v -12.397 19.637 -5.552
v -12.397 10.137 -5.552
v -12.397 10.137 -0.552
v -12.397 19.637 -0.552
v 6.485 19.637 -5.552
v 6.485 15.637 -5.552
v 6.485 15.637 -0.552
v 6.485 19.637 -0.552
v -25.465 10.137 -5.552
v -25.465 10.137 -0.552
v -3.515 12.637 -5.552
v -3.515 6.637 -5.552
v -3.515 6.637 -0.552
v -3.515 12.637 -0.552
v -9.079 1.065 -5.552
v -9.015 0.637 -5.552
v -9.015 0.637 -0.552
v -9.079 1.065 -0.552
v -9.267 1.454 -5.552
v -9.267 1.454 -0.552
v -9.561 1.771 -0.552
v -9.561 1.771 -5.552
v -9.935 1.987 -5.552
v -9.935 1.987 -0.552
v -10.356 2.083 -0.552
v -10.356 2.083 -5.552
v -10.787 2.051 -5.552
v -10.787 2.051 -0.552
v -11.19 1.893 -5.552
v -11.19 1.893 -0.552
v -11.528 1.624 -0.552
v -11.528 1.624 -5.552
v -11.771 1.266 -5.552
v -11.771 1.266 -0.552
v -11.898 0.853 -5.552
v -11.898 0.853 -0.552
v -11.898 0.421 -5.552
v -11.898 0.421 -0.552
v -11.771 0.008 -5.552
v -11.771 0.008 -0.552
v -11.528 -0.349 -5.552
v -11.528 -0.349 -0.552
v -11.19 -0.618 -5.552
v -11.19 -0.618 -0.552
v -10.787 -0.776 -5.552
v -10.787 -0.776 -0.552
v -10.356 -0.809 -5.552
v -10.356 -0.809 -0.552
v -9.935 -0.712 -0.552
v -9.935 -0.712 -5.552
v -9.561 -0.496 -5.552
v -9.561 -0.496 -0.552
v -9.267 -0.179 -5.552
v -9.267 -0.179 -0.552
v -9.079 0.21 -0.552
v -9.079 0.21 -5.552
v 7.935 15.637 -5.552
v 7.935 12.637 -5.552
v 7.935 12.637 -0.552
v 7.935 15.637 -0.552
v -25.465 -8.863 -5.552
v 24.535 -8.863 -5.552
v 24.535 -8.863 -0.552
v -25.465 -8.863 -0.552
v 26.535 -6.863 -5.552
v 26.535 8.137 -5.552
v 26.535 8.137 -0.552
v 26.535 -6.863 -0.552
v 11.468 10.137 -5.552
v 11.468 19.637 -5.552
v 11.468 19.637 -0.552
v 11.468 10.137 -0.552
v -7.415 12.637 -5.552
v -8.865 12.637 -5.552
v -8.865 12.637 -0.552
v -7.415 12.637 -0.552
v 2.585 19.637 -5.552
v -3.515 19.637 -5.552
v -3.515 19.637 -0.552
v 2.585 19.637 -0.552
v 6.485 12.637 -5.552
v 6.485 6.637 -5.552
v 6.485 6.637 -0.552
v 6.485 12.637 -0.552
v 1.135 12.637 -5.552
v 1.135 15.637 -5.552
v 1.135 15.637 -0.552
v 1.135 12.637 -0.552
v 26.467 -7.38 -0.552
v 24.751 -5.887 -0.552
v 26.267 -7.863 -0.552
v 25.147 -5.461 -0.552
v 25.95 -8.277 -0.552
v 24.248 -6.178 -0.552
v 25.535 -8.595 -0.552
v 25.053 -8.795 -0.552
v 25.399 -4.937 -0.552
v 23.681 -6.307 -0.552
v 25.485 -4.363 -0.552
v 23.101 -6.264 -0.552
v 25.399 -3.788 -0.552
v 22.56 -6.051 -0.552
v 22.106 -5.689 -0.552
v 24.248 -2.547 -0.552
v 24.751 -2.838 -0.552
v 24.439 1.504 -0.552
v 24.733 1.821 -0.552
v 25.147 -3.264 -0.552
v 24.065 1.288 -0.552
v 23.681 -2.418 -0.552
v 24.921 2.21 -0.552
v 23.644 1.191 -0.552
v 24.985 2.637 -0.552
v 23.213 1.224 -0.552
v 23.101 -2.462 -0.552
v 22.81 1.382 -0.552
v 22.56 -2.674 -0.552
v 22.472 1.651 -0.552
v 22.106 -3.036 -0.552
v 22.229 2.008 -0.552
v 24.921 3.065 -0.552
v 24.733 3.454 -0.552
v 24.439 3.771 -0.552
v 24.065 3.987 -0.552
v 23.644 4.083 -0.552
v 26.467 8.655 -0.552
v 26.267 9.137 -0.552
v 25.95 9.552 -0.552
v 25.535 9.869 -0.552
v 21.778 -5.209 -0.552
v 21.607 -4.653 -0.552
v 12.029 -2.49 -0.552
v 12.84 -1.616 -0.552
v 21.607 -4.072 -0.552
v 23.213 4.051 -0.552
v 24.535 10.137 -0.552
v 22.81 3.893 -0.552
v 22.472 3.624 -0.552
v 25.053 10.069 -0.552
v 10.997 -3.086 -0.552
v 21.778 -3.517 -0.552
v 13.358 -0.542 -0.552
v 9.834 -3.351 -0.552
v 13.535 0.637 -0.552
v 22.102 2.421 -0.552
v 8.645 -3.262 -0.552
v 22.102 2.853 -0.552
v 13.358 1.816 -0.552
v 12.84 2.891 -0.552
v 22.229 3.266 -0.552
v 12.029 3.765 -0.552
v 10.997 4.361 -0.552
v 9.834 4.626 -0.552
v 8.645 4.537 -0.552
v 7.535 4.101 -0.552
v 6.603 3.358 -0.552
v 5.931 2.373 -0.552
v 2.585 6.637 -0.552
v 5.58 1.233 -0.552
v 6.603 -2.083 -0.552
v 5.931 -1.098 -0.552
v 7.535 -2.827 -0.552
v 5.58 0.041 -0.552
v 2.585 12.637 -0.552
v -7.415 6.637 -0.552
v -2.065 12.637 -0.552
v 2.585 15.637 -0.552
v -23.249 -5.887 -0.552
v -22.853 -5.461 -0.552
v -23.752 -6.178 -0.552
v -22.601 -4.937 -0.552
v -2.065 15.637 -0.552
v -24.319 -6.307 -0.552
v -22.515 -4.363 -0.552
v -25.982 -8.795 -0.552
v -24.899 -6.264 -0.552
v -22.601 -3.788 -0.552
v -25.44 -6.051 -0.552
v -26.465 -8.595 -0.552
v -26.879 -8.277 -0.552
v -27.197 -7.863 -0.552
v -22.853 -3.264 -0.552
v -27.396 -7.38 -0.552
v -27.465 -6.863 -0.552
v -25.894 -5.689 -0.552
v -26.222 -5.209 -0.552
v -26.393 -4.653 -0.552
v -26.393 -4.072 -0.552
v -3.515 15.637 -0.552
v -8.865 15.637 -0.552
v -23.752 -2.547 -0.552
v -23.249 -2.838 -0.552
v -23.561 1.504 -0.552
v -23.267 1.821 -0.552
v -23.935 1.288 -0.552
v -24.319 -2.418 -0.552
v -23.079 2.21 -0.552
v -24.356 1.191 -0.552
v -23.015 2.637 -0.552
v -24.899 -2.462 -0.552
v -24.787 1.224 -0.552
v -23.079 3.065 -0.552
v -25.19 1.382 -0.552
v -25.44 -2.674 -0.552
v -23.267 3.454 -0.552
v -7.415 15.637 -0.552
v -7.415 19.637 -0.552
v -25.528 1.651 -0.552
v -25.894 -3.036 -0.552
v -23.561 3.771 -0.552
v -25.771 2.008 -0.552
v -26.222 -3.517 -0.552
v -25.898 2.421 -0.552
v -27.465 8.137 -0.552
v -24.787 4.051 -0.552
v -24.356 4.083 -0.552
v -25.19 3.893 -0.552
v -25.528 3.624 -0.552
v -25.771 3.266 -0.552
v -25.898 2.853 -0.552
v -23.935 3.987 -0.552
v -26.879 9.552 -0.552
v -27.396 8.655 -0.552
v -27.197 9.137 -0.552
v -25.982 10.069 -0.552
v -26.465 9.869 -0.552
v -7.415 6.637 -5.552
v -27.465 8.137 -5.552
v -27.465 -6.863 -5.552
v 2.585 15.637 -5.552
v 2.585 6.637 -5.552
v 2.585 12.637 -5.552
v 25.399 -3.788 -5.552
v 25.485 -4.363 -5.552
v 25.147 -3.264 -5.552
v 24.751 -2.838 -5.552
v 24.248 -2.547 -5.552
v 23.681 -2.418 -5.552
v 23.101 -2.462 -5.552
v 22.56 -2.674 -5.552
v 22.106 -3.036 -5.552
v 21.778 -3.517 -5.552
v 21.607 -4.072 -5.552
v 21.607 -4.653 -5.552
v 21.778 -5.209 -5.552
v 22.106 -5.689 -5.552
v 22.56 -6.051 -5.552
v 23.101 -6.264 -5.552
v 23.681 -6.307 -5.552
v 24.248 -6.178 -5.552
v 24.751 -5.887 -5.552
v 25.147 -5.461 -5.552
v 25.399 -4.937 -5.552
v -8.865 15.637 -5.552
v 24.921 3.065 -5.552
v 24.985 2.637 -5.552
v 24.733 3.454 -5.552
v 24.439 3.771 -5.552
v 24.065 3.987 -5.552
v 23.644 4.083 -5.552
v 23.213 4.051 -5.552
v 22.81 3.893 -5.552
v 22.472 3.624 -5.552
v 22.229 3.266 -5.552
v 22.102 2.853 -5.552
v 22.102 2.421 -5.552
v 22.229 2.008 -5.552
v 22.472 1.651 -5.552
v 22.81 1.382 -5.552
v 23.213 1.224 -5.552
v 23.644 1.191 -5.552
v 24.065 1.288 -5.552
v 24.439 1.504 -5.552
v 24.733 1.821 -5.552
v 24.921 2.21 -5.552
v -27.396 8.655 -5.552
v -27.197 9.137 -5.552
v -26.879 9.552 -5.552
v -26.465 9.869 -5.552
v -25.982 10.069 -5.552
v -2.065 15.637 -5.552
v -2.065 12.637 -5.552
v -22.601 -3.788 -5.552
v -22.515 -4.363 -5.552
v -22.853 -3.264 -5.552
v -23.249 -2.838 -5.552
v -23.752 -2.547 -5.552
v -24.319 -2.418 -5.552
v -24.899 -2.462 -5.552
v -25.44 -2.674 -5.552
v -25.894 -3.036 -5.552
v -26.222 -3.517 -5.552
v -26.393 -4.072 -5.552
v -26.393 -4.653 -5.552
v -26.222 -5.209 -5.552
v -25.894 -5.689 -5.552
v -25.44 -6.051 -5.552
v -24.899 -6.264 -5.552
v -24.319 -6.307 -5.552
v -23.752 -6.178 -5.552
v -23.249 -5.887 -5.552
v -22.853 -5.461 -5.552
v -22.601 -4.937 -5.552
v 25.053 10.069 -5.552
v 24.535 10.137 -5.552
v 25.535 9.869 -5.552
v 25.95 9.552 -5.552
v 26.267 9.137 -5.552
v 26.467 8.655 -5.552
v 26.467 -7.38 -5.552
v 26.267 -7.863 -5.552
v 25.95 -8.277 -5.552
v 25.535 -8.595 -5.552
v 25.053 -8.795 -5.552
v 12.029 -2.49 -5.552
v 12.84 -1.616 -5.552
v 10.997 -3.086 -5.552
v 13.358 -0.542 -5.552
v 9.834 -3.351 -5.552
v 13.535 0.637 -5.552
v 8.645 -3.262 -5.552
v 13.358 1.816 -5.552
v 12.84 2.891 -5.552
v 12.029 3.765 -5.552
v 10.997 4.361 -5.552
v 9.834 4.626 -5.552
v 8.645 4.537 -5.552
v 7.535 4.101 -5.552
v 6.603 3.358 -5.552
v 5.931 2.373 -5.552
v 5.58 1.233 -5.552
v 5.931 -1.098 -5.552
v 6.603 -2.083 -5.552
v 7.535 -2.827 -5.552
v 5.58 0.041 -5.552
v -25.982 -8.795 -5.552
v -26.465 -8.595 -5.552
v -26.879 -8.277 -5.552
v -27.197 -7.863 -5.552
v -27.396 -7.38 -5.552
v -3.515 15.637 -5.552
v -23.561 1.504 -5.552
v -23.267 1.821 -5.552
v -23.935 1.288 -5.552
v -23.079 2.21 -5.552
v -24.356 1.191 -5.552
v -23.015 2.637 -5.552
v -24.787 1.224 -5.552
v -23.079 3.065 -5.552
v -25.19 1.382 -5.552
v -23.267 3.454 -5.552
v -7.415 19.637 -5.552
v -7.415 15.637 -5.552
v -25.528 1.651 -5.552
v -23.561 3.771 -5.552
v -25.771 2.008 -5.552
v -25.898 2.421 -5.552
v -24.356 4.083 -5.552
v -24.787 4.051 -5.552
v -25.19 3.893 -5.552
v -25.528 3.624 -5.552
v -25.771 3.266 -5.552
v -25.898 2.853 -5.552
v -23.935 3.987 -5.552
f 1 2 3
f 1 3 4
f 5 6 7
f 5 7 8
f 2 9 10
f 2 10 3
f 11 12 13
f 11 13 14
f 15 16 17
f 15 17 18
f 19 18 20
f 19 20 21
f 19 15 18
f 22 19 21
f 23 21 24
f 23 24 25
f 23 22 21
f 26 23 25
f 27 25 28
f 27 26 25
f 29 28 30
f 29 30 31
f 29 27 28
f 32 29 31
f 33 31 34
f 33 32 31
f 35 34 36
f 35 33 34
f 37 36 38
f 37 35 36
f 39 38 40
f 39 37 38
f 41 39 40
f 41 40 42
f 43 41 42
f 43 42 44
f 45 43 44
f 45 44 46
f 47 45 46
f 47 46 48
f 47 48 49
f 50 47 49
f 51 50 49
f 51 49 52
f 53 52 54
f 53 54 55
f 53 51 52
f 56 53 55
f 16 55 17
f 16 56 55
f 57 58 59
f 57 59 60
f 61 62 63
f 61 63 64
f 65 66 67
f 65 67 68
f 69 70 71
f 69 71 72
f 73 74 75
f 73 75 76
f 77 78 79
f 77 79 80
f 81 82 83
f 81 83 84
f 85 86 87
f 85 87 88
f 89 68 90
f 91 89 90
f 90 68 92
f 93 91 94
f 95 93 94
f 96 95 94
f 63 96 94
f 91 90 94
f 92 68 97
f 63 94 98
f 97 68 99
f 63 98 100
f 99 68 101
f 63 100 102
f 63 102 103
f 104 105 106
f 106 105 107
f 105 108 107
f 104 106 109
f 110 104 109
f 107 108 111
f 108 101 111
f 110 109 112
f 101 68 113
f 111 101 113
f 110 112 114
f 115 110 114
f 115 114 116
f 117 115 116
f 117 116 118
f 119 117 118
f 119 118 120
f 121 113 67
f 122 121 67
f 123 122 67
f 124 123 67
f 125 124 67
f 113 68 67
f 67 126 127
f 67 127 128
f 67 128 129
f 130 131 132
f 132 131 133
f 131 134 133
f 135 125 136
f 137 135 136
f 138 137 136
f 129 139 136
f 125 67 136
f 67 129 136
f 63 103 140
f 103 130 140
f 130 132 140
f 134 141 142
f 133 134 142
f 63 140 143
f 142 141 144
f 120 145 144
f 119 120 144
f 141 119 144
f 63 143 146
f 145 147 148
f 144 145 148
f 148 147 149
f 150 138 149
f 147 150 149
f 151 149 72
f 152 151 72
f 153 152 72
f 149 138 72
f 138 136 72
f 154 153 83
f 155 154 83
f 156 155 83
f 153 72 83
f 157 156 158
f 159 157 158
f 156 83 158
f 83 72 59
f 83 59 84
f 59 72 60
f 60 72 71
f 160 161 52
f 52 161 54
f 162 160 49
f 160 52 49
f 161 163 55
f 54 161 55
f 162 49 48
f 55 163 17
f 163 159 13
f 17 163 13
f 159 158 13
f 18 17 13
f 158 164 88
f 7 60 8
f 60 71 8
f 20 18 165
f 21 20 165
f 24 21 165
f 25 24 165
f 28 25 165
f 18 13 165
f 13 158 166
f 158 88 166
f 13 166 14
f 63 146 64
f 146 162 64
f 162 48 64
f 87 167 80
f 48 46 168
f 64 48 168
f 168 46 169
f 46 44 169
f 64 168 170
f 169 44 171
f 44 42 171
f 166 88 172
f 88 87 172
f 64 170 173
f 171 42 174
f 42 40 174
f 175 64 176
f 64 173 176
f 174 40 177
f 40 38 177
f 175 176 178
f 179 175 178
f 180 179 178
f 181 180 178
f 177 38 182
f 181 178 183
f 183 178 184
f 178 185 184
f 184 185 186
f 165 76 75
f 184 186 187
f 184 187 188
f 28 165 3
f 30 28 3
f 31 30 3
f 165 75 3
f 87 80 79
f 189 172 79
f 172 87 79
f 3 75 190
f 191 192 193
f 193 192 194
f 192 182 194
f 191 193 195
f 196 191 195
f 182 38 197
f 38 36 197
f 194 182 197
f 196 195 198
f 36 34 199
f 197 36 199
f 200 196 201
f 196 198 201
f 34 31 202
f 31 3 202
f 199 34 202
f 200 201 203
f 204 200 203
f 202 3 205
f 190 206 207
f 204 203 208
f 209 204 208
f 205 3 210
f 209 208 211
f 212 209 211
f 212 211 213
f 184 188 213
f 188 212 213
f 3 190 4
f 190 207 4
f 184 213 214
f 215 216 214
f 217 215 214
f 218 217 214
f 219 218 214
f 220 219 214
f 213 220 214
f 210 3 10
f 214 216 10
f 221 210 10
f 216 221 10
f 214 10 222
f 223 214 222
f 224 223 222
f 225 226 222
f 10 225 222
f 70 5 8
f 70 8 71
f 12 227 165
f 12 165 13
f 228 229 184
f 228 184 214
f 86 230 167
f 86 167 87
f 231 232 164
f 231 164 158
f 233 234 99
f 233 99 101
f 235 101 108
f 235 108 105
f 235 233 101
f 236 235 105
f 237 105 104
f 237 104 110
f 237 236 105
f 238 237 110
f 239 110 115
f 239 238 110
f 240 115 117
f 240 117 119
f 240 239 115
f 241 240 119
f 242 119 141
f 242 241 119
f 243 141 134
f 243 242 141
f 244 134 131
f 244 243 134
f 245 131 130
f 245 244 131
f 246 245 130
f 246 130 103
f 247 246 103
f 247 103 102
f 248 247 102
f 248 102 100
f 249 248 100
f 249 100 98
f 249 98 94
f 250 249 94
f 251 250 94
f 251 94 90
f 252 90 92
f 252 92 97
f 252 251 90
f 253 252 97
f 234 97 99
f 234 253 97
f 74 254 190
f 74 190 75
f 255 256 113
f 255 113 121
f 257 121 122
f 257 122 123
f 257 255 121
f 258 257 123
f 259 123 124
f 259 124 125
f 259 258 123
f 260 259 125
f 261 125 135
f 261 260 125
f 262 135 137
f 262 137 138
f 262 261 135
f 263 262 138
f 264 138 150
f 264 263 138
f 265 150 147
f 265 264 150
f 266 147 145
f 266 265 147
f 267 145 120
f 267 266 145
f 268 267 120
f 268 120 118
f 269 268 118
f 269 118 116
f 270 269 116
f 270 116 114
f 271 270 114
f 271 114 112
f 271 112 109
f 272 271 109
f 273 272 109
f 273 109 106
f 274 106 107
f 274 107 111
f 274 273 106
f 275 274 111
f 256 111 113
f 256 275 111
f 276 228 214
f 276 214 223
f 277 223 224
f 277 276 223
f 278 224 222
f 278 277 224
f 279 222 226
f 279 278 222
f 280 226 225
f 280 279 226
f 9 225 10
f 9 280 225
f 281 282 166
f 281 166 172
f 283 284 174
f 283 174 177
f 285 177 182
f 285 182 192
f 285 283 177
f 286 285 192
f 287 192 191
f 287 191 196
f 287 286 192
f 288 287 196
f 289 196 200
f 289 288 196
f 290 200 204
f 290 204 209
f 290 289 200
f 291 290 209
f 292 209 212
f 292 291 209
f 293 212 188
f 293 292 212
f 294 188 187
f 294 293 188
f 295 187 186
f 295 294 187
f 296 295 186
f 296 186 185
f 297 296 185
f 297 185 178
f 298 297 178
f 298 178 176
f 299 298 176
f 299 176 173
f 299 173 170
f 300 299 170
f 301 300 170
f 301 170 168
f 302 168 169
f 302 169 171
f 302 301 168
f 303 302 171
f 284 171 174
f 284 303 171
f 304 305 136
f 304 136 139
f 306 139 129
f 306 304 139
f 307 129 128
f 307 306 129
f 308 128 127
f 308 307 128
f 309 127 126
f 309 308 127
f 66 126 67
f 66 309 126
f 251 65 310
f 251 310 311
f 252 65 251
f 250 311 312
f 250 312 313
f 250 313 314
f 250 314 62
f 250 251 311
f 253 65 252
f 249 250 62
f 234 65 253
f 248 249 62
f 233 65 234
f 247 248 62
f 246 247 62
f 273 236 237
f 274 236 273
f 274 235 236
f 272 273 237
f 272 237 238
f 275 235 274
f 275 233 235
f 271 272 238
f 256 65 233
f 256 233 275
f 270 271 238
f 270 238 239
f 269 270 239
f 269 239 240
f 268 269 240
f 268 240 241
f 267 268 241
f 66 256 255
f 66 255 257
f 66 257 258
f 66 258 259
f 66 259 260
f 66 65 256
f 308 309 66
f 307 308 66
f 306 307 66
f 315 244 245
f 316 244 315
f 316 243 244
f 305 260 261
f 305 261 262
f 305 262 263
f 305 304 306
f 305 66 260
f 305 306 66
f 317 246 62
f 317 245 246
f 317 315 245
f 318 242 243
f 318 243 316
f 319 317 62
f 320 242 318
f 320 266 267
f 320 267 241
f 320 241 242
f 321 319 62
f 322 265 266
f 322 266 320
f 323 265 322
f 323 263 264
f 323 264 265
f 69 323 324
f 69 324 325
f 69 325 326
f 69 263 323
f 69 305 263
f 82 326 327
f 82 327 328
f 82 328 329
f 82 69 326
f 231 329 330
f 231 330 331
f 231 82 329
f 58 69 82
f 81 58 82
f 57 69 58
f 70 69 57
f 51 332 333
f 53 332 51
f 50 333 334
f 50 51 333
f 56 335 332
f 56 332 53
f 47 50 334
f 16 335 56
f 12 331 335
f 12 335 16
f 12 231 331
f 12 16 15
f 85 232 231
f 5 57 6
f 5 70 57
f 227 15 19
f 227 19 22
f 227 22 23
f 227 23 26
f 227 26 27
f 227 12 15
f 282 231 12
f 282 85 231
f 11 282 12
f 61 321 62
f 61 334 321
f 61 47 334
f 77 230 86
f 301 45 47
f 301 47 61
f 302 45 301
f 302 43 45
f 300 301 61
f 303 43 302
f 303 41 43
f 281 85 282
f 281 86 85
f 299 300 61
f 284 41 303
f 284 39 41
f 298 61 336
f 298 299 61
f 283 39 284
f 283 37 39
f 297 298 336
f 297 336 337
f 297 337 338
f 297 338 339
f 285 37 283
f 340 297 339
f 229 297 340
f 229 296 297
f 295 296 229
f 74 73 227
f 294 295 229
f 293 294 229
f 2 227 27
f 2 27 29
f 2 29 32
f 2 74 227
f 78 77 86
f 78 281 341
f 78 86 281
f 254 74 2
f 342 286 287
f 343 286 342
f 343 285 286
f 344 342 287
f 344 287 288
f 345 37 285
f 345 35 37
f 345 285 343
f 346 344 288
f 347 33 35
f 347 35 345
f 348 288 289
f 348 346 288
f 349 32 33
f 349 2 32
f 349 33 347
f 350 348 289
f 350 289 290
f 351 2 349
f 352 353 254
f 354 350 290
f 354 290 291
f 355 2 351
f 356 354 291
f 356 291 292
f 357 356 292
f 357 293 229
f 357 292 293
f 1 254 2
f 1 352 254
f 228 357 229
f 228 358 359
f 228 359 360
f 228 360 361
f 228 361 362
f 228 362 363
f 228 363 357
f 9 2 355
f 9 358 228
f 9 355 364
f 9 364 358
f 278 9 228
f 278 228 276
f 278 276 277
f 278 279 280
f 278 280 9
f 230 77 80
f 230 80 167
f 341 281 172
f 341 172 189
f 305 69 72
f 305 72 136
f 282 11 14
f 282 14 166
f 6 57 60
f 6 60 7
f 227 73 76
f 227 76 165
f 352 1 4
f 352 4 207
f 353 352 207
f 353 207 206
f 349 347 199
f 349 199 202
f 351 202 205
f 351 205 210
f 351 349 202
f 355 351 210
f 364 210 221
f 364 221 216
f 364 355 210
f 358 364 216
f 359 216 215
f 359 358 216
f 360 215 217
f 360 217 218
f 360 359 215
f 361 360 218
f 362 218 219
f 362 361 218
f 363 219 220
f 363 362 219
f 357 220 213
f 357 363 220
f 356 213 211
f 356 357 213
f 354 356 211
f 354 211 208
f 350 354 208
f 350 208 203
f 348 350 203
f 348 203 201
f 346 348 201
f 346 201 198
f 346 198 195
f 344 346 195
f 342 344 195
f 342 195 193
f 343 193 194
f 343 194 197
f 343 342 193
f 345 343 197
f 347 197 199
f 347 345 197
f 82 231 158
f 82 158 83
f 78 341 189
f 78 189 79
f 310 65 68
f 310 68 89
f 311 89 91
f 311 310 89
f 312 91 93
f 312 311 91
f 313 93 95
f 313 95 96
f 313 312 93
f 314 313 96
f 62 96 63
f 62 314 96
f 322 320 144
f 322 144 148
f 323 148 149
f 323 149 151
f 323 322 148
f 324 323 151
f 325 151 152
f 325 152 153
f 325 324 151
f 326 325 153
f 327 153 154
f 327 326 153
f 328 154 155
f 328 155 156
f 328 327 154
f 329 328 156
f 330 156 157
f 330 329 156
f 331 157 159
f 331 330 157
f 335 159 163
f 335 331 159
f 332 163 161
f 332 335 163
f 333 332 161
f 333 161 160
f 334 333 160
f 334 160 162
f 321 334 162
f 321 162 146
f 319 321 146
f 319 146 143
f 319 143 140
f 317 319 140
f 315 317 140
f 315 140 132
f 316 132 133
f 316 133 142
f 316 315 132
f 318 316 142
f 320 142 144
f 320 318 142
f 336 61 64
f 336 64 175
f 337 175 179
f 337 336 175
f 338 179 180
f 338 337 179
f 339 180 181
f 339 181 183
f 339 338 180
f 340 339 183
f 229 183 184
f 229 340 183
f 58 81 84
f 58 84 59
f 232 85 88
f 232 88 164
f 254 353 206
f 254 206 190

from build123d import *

# Parameters (mm, degrees)
SKETCH1_R           = 1.95
SKETCH1_R_2         = 4
SKETCH1_R_3         = 1.45
BOSS_EXTRUDE1_DEPTH = 5


with BuildPart() as part:
    # Sketch1 → Boss-Extrude1 (new body)
    with BuildSketch(Plane.XY.offset(-5.551615438)):
        with BuildLine():
            Line((-25.464626351, 10.13731735), (-12.396849296, 10.13731735))
            Line((-12.396849296, 10.13731735), (-12.396849296, 19.63731735))
            Line((-12.396849296, 19.63731735), (-7.414626351, 19.63731735))
            Line((-7.414626351, 19.63731735), (-7.414626351, 15.63731735))
            Line((-7.414626351, 15.63731735), (-8.864626351, 15.63731735))
            Line((-8.864626351, 15.63731735), (-8.864626351, 12.63731735))
            Line((-8.864626351, 12.63731735), (-7.414626351, 12.63731735))
            Line((-7.414626351, 12.63731735), (-7.414626351, 6.63731735))
            Line((-7.414626351, 6.63731735), (-3.514626351, 6.63731735))
            Line((-3.514626351, 6.63731735), (-3.514626351, 12.63731735))
            Line((-3.514626351, 12.63731735), (-2.064626351, 12.63731735))
            Line((-2.064626351, 12.63731735), (-2.064626351, 15.63731735))
            Line((-2.064626351, 15.63731735), (-3.514626351, 15.63731735))
            Line((-3.514626351, 15.63731735), (-3.514626351, 19.63731735))
            Line((-3.514626351, 19.63731735), (2.585373649, 19.63731735))
            Line((2.585373649, 19.63731735), (2.585373649, 15.63731735))
            Line((2.585373649, 15.63731735), (1.135373649, 15.63731735))
            Line((1.135373649, 15.63731735), (1.135373649, 12.63731735))
            Line((1.135373649, 12.63731735), (2.585373649, 12.63731735))
            Line((2.585373649, 12.63731735), (2.585373649, 6.63731735))
            Line((2.585373649, 6.63731735), (6.485373649, 6.63731735))
            Line((6.485373649, 6.63731735), (6.485373649, 12.63731735))
            Line((6.485373649, 12.63731735), (7.935373649, 12.63731735))
            Line((7.935373649, 12.63731735), (7.935373649, 15.63731735))
            Line((7.935373649, 15.63731735), (6.485373649, 15.63731735))
            Line((6.485373649, 15.63731735), (6.485373649, 19.63731735))
            Line((6.485373649, 19.63731735), (11.467596593, 19.63731735))
            Line((11.467596593, 19.63731735), (11.467596593, 10.13731735))
            Line((11.467596593, 10.13731735), (24.535373649, 10.13731735))
            ThreePointArc((24.535373649, 10.13731735), (25.949587211, 9.551530913), (26.535373649, 8.13731735))
            Line((26.535373649, 8.13731735), (26.535373649, -6.86268265))
            ThreePointArc((26.535373649, -6.86268265), (25.949587211, -8.276896212), (24.535373649, -8.86268265))
            Line((24.535373649, -8.86268265), (-10, -8.86268265))
            Line((-10, -8.86268265), (-25.464626351, -8.86268265))
            ThreePointArc((-25.464626351, -8.86268265), (-26.878839913, -8.276896212), (-27.464626351, -6.86268265))
            Line((-27.464626351, -6.86268265), (-27.464626351, 8.13731735))
            ThreePointArc((-27.464626351, 8.13731735), (-26.878839913, 9.551530913), (-25.464626351, 10.13731735))
        make_face()
        with Locations((-24.464626351, -4.36268265)):
            Circle(SKETCH1_R, mode=Mode.SUBTRACT)
        with Locations((23.535373649, -4.36268265)):
            Circle(SKETCH1_R, mode=Mode.SUBTRACT)
        with Locations((9.535373649, 0.63731735)):
            Circle(SKETCH1_R_2, mode=Mode.SUBTRACT)
        with Locations((-10.464626351, 0.63731735)):
            Circle(SKETCH1_R_3, mode=Mode.SUBTRACT)
        with Locations((-24.464626351, 2.63731735)):
            Circle(SKETCH1_R_3, mode=Mode.SUBTRACT)
        with Locations((23.535373649, 2.63731735)):
            Circle(SKETCH1_R_3, mode=Mode.SUBTRACT)
    extrude(amount=BOSS_EXTRUDE1_DEPTH)


solid = part.part
